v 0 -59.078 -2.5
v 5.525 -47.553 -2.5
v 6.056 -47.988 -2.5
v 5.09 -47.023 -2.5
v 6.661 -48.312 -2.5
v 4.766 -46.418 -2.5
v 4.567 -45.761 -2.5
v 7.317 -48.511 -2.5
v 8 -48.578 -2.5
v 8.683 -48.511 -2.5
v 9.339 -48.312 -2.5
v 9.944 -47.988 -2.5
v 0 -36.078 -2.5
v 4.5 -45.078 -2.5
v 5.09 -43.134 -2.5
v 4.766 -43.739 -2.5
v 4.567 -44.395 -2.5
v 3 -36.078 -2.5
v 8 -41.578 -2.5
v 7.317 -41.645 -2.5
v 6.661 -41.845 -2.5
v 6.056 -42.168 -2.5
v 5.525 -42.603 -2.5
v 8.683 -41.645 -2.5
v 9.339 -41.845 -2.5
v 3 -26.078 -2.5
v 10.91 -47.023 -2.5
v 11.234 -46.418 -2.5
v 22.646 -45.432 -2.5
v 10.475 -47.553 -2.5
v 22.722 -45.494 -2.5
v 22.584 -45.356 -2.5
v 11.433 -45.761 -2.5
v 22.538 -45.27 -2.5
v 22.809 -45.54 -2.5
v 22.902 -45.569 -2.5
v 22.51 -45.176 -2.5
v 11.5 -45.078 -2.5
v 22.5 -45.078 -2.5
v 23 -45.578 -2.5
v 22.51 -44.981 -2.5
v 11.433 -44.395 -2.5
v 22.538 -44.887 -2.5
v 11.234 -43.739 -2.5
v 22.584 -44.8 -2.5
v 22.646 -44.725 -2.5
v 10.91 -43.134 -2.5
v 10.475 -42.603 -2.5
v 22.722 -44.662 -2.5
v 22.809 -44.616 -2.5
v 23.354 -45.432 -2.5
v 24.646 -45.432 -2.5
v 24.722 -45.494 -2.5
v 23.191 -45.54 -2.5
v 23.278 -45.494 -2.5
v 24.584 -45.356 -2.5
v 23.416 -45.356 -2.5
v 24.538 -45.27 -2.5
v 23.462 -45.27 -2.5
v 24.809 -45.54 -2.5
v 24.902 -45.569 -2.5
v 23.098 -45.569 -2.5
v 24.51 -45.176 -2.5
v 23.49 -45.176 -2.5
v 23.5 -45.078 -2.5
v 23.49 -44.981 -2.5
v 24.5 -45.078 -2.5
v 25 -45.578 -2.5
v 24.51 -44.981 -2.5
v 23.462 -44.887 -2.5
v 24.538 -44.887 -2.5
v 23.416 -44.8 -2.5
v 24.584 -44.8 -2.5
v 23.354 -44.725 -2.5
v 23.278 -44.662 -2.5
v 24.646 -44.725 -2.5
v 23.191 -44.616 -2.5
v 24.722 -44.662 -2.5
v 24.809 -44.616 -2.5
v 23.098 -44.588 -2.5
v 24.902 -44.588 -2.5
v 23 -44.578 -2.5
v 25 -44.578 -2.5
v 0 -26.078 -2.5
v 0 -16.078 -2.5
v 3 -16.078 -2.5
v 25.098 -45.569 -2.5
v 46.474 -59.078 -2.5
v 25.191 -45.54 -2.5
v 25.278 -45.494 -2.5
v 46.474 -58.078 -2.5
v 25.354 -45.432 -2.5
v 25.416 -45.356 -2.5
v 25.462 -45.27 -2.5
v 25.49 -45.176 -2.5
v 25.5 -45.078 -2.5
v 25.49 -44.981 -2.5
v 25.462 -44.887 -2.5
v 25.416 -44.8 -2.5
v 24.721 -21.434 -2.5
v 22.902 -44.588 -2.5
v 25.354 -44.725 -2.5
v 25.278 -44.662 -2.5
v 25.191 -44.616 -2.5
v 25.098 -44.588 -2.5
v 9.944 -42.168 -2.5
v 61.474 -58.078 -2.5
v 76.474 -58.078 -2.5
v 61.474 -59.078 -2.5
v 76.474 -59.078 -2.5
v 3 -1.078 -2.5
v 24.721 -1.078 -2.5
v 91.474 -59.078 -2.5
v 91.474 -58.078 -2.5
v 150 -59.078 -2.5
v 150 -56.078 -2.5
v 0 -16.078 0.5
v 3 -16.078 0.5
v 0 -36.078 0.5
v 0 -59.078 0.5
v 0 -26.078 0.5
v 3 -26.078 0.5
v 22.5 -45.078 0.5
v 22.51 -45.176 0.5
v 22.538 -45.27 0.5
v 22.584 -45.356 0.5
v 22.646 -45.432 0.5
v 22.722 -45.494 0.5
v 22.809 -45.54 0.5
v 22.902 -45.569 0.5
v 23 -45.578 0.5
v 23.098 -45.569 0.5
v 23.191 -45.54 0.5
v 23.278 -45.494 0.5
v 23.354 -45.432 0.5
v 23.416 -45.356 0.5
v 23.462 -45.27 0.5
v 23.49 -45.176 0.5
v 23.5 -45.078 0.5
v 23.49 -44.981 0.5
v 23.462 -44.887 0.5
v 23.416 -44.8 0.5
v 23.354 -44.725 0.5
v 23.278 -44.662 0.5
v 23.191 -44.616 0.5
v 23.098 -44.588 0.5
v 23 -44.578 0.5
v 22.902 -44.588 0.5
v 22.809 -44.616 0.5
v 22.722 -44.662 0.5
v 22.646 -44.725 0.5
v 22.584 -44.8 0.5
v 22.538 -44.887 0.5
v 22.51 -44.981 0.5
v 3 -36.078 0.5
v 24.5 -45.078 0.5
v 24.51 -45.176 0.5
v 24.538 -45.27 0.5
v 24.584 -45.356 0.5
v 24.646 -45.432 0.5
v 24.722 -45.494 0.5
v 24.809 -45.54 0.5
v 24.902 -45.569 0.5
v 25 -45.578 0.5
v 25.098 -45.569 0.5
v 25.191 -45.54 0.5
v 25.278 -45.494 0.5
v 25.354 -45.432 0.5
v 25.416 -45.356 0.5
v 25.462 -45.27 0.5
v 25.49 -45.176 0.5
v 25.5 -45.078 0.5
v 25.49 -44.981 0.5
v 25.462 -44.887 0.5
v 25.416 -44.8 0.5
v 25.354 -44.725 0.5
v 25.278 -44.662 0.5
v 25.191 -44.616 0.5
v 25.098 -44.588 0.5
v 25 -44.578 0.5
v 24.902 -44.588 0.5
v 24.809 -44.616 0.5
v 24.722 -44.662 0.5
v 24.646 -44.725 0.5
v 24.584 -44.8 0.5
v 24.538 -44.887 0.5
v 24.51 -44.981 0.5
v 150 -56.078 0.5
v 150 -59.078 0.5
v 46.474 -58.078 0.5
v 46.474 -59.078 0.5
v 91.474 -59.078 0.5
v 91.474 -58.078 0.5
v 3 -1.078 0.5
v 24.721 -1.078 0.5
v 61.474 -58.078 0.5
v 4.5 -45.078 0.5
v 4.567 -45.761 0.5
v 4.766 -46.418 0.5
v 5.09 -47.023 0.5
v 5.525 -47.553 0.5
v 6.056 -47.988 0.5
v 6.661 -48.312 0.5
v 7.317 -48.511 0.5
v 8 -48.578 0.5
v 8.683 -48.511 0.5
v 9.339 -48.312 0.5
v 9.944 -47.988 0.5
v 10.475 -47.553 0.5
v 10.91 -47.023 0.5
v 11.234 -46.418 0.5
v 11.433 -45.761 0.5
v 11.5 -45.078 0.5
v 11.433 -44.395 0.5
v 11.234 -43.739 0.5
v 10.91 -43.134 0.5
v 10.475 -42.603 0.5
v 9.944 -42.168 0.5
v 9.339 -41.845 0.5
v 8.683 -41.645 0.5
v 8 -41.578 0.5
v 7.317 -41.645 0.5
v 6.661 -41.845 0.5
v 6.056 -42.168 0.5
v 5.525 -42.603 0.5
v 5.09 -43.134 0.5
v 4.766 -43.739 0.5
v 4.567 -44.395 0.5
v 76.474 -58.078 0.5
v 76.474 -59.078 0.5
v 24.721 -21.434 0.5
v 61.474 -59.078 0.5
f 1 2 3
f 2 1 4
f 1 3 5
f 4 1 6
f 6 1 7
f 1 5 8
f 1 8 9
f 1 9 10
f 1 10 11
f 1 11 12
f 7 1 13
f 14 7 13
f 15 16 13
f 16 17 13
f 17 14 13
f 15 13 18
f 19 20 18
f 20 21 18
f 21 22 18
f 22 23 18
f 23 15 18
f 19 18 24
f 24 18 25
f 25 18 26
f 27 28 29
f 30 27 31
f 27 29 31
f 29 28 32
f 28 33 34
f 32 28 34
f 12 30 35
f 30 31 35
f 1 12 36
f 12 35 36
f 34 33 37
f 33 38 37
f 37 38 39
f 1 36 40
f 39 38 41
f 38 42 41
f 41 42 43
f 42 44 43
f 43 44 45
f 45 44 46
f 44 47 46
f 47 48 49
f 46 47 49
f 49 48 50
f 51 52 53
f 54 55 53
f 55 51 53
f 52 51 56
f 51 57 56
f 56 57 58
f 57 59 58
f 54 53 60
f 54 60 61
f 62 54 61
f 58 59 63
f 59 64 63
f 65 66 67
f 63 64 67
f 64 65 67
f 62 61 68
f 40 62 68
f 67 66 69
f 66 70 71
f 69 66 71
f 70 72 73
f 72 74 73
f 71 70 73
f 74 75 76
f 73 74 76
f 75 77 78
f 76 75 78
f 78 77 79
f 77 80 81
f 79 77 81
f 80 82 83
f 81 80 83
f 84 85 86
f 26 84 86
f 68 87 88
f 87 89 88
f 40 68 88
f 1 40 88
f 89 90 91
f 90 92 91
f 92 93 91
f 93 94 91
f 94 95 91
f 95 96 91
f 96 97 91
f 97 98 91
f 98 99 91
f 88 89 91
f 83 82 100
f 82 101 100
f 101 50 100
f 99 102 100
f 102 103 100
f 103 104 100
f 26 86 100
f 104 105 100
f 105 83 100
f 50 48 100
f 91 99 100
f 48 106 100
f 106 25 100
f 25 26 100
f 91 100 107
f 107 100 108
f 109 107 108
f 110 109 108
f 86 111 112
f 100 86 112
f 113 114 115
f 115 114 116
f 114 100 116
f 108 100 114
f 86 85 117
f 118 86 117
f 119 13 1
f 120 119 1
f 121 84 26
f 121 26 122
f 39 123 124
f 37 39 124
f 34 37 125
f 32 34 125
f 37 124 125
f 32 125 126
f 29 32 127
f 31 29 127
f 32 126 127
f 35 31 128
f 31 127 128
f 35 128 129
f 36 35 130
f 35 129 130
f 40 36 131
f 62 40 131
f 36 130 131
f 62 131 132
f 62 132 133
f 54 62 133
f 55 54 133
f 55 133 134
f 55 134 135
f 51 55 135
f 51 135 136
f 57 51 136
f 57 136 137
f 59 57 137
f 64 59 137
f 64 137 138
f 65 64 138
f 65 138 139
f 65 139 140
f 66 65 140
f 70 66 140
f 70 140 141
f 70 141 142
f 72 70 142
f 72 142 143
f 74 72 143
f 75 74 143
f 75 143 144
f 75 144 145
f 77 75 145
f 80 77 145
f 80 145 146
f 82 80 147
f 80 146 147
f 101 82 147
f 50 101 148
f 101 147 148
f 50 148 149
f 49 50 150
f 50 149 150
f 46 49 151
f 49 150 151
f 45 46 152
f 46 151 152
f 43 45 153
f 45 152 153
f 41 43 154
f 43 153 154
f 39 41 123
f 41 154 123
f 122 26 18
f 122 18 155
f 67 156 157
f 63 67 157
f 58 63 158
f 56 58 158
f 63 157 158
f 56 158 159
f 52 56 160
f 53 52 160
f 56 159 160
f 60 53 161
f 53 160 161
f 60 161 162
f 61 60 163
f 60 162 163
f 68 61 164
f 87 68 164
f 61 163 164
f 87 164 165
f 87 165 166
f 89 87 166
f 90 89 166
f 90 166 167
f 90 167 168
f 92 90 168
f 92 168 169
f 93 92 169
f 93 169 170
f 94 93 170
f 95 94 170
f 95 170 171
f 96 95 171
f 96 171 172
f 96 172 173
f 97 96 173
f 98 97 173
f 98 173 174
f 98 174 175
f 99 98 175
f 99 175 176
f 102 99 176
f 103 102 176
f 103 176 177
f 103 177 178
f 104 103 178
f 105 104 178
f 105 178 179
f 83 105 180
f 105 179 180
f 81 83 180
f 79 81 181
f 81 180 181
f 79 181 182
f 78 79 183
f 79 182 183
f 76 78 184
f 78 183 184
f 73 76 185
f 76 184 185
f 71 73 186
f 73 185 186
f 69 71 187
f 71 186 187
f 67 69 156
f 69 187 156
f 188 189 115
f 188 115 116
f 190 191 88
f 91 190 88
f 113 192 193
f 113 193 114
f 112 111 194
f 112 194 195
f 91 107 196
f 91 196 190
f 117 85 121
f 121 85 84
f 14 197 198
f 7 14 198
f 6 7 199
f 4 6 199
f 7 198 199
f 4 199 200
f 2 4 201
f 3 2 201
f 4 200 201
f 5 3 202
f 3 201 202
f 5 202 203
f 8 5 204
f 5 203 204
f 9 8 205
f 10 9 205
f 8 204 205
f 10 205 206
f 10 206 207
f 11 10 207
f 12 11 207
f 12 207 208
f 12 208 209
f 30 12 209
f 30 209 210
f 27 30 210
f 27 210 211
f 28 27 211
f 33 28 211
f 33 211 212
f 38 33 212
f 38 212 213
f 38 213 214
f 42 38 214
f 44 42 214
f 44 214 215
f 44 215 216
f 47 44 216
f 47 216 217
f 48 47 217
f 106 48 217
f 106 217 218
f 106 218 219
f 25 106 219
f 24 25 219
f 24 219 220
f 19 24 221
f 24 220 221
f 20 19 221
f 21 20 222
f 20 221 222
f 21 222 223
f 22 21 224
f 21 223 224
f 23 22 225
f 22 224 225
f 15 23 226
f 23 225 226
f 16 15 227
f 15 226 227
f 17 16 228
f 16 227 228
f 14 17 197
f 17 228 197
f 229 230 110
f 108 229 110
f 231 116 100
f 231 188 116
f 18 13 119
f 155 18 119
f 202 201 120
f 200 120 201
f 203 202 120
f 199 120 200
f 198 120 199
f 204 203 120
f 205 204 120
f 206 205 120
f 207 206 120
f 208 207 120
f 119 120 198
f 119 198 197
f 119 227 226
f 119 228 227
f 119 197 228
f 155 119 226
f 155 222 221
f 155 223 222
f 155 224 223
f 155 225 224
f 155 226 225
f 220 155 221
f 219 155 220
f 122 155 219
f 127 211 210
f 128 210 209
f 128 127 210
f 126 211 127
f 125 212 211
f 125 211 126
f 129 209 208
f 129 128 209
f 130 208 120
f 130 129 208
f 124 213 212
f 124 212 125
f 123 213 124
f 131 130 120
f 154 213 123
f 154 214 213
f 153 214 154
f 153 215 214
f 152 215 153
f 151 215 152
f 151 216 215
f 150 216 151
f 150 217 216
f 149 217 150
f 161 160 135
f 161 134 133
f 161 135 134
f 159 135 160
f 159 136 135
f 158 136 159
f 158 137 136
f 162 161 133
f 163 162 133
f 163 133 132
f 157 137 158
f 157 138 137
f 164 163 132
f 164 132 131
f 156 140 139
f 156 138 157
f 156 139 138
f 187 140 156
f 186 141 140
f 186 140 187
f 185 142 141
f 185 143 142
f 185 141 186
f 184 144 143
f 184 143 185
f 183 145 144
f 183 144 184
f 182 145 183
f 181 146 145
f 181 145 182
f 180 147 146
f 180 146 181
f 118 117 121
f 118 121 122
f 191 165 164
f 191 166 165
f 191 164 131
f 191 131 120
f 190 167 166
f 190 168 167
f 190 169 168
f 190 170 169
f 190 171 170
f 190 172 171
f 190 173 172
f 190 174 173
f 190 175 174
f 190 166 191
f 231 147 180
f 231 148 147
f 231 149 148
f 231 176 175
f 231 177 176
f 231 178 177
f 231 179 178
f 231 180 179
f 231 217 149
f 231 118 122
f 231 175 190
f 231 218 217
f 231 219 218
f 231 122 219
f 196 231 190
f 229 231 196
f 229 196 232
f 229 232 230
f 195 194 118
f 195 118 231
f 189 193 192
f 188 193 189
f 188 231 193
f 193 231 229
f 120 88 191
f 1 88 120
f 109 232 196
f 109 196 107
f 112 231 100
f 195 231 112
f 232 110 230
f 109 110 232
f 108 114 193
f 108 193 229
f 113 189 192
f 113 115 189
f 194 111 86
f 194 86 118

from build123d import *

# Parameters (mm, degrees)
EXTRUDE_1_DEPTH      = 0.5
EXTRUDE_2_DEPTH      = 109.5
SKETCH_8_W           = 60
SKETCH_8_H           = 8
SKETCH_8_W_2         = 60.000005443
CUT_EXTRUDE_2_DEPTH  = 10
CUT_EXTRUDE_3_DEPTH  = 10
EXTRUDE_4_DEPTH      = 2.5
FILLET_3_R           = 0.25
FILLET_4_R           = 0.25
SKETCH_7_R           = 3.5
SKETCH_7_R_2         = 0.5
CUT_EXTRUDE_4_DEPTH  = 244
SKETCH_11_W          = 306.812384231
SKETCH_11_H          = 135.84704279
CUT_EXTRUDE_6_DEPTH  = 266
SKETCH_15_W          = 3
SKETCH_15_H          = 15
SKETCH_15_H_2        = 10
CUT_EXTRUDE_9_DEPTH  = 3
SKETCH_16_W          = 15
SKETCH_16_H          = 3
CUT_EXTRUDE_10_DEPTH = 1


with BuildPart() as part:
    # 草图1 → 凸台-拉伸1 (new body)
    with BuildSketch(Plane.XY):
        Polygon((0, -1.078212291), (0, -59.078212291), (150, -59.078212291), (150, -56.078212291), (24.720670391, -21.433997855), (24.720670391, -1.078212291), align=None)
    extrude(amount=EXTRUDE_1_DEPTH)

    # 草图2 → 凸台-拉伸2 (add)
    with BuildSketch(Plane(origin=(0, 0, 0), x_dir=(-1, 0, 0), z_dir=(0, 0, -1))):
        with BuildLine():
            Line((0, -1.078212291), (-2.47, -1.078212291))
            Line((-2.47, -1.078212291), (-2.47, -54.078212291))
            Line((-2.47, -54.078212291), (-149.757622023, -58.570819212))
            ThreePointArc((-149.757622023, -58.570819212), (-149.929451255, -58.64664195), (-150, -58.820702994))
            Line((-150, -58.820702994), (-150, -58.828212291))
            ThreePointArc((-150, -58.828212291), (-149.926776695, -59.004988986), (-149.75, -59.078212291))
            Line((-149.75, -59.078212291), (0, -59.078212291))
            Line((0, -59.078212291), (0, -1.078212291))
        make_face()
    extrude(amount=EXTRUDE_2_DEPTH)

    # 镜向3: part across plane


with BuildPart() as part_1:
    add(part.part)
    add(part.part.mirror(Plane(origin=(149.75, -58.820702994, -109.5), x_dir=(1, 0, 0), z_dir=(0, 0, 1))))

    # 草图8 → 切除-拉伸2 (cut)
    with BuildSketch(Plane(origin=(-1.645679091, -53.952674733, 0), x_dir=(0.9995351300973986, -0.030488091136977483, 0), z_dir=(0.030488091136977483, 0.9995351300973986, 0))):
        with Locations((121.473716686, 5)):
            Rectangle(SKETCH_8_W, SKETCH_8_H)
        with Locations((121.473713965, 15)):
            Rectangle(SKETCH_8_W_2, SKETCH_8_H)
        with Locations((121.473713965, 24.947368421)):
            Rectangle(SKETCH_8_W_2, SKETCH_8_H)
        with Locations((121.473713965, 34.894736842)):
            Rectangle(SKETCH_8_W_2, SKETCH_8_H)
        with Locations((121.473713965, 44.842105263)):
            Rectangle(SKETCH_8_W_2, SKETCH_8_H)
        with Locations((121.473713965, 54.789473684)):
            Rectangle(SKETCH_8_W_2, SKETCH_8_H)
        with Locations((121.473713965, 64.736842105)):
            Rectangle(SKETCH_8_W_2, SKETCH_8_H)
        with Locations((121.473713965, 74.684210526)):
            Rectangle(SKETCH_8_W_2, SKETCH_8_H)
        with Locations((121.473713965, 84.631578947)):
            Rectangle(SKETCH_8_W_2, SKETCH_8_H)
        with Locations((121.473713965, 94.578947368)):
            Rectangle(SKETCH_8_W_2, SKETCH_8_H)
        with Locations((121.473713965, 104.526315789)):
            Rectangle(SKETCH_8_W_2, SKETCH_8_H)
        with Locations((121.473713965, 114.473684211)):
            Rectangle(SKETCH_8_W_2, SKETCH_8_H)
        with Locations((121.473713965, 124.421052632)):
            Rectangle(SKETCH_8_W_2, SKETCH_8_H)
        with Locations((121.473713965, 134.368421053)):
            Rectangle(SKETCH_8_W_2, SKETCH_8_H)
        with Locations((121.473713965, 144.315789474)):
            Rectangle(SKETCH_8_W_2, SKETCH_8_H)
        with Locations((121.473713965, 154.263157895)):
            Rectangle(SKETCH_8_W_2, SKETCH_8_H)
        with Locations((121.473713965, 164.210526316)):
            Rectangle(SKETCH_8_W_2, SKETCH_8_H)
        with Locations((121.473713965, 174.157894737)):
            Rectangle(SKETCH_8_W_2, SKETCH_8_H)
        with Locations((121.473713965, 184.105263158)):
            Rectangle(SKETCH_8_W_2, SKETCH_8_H)
        with Locations((121.473713965, 194.052631579)):
            Rectangle(SKETCH_8_W_2, SKETCH_8_H)
        with Locations((121.473713965, 204)):
            Rectangle(SKETCH_8_W_2, SKETCH_8_H)
        with Locations((121.473716686, 214)):
            Rectangle(SKETCH_8_W, SKETCH_8_H)
    extrude(amount=-CUT_EXTRUDE_2_DEPTH, mode=Mode.SUBTRACT)

    # 草图9 → 切除-拉伸3 (cut)
    with BuildSketch(Plane(origin=(-1.645679091, -53.952674733, 0), x_dir=(0.9995351300973986, -0.030488091136977483, 0), z_dir=(0.030488091136977483, 0.9995351300973986, 0))):
        Polygon((151.639987162, 219), (153.085665737, 219), (154.855962757, 1), (151.716207414, 1), (151.473716686, 1), (151.473716686, 219), align=None)
    extrude(amount=-CUT_EXTRUDE_3_DEPTH, mode=Mode.SUBTRACT)

    # 草图1<3> → 凸台-拉伸4 (add)
    with BuildSketch(Plane.XY):
        Polygon((0, -1.078212291), (0, -59.078212291), (150, -59.078212291), (150, -56.078212291), (24.720670391, -21.433997855), (24.720670391, -1.078212291), align=None)
    extrude_4 = extrude(amount=-EXTRUDE_4_DEPTH)

    # 圆角3
    fillet_3_edges = [part_1.edges().sort_by_distance(p)[0] for p in [
        (149.757622023, -58.570819212, -179.131578947),
        (149.757622023, -58.570819212, -189.078947368),
        (149.757622023, -58.570819212, -199.026315789),
        (149.757622023, -58.570819212, -209),
        (149.757622023, -58.570819212, -218.5),
        (149.757622023, -58.570819212, -89.605263158),
        (149.757622023, -58.570819212, -99.552631579),
        (149.757622023, -58.570819212, -109.5),
        (149.757622023, -58.570819212, -119.447368421),
        (149.757622023, -58.570819212, -129.394736842),
        (149.757622023, -58.570819212, -139.342105263),
        (149.757622023, -58.570819212, -149.289473684),
        (149.757622023, -58.570819212, -159.236842105),
        (149.757622023, -58.570819212, -169.184210526),
        (149.757622023, -58.570819212, -79.657894737),
        (149.757622023, -58.570819212, -69.710526316),
        (149.757622023, -58.570819212, -59.763157895),
        (149.757622023, -58.570819212, -49.815789474),
        (149.757622023, -58.570819212, -39.868421053),
        (149.757622023, -58.570819212, -29.921052632),
        (149.757622023, -58.570819212, -19.973684211),
        (149.757622023, -58.570819212, -10),
    ]]
    fillet(fillet_3_edges, radius=FILLET_3_R)

    # 圆角4
    fillet_4_edges = [part_1.edges().sort_by_distance(p)[0] for p in [
        (149.742145382, -59.078212291, -49.815789474),
        (149.742145382, -59.078212291, -39.868421053),
        (149.742145382, -59.078212291, -29.921052632),
        (149.742145382, -59.078212291, -19.973684211),
        (149.742145382, -59.078212291, -10),
        (149.742145382, -59.078212291, -69.710526316),
        (149.742145382, -59.078212291, -59.763157895),
        (149.742145382, -59.078212291, -89.605263158),
        (149.742145382, -59.078212291, -79.657894737),
        (149.742145382, -59.078212291, -129.394736842),
        (149.742145382, -59.078212291, -119.447368421),
        (149.742145382, -59.078212291, -109.5),
        (149.742145382, -59.078212291, -99.552631579),
        (149.742145382, -59.078212291, -139.342105263),
        (149.742145382, -59.078212291, -149.289473684),
        (149.742145382, -59.078212291, -159.236842105),
        (149.742145382, -59.078212291, -169.184210526),
        (149.742145382, -59.078212291, -218.5),
        (149.742145382, -59.078212291, -209),
        (149.742145382, -59.078212291, -199.026315789),
        (149.742145382, -59.078212291, -189.078947368),
        (149.742145382, -59.078212291, -179.131578947),
    ]]
    fillet(fillet_4_edges, radius=FILLET_4_R)

    # 镜向4: 凸台-拉伸4 across plane
    add(extrude_4.mirror(Plane.XY.offset(-109.5)))

    # 草图7 → 切除-拉伸4 (cut)
    with BuildSketch(Plane.XY.offset(0.5)):
        with Locations((8, -45.078212291)):
            Circle(SKETCH_7_R)
        with Locations((25, -45.078212291)):
            Circle(SKETCH_7_R_2)
        with Locations((23, -45.078212291)):
            Circle(SKETCH_7_R_2)
    extrude(amount=-CUT_EXTRUDE_4_DEPTH, mode=Mode.SUBTRACT)

    # 草图11 → 切除-拉伸6 (cut)
    with BuildSketch(Plane(origin=(150, 0, 0), x_dir=(0, 0, -1), z_dir=(1, 0, 0))):
        with Locations((155.906192116, 8.845309104)):
            Rectangle(SKETCH_11_W, SKETCH_11_H)
    extrude(amount=-CUT_EXTRUDE_6_DEPTH, mode=Mode.SUBTRACT)

    # 草图15 → 切除-拉伸9 (cut)
    with BuildSketch(Plane.ZY):
        with Locations((-1, -8.578212291)):
            Rectangle(SKETCH_15_W, SKETCH_15_H)
        with Locations((-1, -31.078212291)):
            Rectangle(SKETCH_15_W, SKETCH_15_H_2)
    extrude(amount=-CUT_EXTRUDE_9_DEPTH, mode=Mode.SUBTRACT)

    # 草图16 → 切除-拉伸10 (cut)
    with BuildSketch(Plane(origin=(0, -59.078212291, 0), x_dir=(-1, 0, 0), z_dir=(0, -1, 0))):
        with Locations((-83.973716686, 1)):
            Rectangle(SKETCH_16_W, SKETCH_16_H)
        with Locations((-53.973716686, 1)):
            Rectangle(SKETCH_16_W, SKETCH_16_H)
    extrude(amount=-CUT_EXTRUDE_10_DEPTH, mode=Mode.SUBTRACT)


solid = part_1.part
